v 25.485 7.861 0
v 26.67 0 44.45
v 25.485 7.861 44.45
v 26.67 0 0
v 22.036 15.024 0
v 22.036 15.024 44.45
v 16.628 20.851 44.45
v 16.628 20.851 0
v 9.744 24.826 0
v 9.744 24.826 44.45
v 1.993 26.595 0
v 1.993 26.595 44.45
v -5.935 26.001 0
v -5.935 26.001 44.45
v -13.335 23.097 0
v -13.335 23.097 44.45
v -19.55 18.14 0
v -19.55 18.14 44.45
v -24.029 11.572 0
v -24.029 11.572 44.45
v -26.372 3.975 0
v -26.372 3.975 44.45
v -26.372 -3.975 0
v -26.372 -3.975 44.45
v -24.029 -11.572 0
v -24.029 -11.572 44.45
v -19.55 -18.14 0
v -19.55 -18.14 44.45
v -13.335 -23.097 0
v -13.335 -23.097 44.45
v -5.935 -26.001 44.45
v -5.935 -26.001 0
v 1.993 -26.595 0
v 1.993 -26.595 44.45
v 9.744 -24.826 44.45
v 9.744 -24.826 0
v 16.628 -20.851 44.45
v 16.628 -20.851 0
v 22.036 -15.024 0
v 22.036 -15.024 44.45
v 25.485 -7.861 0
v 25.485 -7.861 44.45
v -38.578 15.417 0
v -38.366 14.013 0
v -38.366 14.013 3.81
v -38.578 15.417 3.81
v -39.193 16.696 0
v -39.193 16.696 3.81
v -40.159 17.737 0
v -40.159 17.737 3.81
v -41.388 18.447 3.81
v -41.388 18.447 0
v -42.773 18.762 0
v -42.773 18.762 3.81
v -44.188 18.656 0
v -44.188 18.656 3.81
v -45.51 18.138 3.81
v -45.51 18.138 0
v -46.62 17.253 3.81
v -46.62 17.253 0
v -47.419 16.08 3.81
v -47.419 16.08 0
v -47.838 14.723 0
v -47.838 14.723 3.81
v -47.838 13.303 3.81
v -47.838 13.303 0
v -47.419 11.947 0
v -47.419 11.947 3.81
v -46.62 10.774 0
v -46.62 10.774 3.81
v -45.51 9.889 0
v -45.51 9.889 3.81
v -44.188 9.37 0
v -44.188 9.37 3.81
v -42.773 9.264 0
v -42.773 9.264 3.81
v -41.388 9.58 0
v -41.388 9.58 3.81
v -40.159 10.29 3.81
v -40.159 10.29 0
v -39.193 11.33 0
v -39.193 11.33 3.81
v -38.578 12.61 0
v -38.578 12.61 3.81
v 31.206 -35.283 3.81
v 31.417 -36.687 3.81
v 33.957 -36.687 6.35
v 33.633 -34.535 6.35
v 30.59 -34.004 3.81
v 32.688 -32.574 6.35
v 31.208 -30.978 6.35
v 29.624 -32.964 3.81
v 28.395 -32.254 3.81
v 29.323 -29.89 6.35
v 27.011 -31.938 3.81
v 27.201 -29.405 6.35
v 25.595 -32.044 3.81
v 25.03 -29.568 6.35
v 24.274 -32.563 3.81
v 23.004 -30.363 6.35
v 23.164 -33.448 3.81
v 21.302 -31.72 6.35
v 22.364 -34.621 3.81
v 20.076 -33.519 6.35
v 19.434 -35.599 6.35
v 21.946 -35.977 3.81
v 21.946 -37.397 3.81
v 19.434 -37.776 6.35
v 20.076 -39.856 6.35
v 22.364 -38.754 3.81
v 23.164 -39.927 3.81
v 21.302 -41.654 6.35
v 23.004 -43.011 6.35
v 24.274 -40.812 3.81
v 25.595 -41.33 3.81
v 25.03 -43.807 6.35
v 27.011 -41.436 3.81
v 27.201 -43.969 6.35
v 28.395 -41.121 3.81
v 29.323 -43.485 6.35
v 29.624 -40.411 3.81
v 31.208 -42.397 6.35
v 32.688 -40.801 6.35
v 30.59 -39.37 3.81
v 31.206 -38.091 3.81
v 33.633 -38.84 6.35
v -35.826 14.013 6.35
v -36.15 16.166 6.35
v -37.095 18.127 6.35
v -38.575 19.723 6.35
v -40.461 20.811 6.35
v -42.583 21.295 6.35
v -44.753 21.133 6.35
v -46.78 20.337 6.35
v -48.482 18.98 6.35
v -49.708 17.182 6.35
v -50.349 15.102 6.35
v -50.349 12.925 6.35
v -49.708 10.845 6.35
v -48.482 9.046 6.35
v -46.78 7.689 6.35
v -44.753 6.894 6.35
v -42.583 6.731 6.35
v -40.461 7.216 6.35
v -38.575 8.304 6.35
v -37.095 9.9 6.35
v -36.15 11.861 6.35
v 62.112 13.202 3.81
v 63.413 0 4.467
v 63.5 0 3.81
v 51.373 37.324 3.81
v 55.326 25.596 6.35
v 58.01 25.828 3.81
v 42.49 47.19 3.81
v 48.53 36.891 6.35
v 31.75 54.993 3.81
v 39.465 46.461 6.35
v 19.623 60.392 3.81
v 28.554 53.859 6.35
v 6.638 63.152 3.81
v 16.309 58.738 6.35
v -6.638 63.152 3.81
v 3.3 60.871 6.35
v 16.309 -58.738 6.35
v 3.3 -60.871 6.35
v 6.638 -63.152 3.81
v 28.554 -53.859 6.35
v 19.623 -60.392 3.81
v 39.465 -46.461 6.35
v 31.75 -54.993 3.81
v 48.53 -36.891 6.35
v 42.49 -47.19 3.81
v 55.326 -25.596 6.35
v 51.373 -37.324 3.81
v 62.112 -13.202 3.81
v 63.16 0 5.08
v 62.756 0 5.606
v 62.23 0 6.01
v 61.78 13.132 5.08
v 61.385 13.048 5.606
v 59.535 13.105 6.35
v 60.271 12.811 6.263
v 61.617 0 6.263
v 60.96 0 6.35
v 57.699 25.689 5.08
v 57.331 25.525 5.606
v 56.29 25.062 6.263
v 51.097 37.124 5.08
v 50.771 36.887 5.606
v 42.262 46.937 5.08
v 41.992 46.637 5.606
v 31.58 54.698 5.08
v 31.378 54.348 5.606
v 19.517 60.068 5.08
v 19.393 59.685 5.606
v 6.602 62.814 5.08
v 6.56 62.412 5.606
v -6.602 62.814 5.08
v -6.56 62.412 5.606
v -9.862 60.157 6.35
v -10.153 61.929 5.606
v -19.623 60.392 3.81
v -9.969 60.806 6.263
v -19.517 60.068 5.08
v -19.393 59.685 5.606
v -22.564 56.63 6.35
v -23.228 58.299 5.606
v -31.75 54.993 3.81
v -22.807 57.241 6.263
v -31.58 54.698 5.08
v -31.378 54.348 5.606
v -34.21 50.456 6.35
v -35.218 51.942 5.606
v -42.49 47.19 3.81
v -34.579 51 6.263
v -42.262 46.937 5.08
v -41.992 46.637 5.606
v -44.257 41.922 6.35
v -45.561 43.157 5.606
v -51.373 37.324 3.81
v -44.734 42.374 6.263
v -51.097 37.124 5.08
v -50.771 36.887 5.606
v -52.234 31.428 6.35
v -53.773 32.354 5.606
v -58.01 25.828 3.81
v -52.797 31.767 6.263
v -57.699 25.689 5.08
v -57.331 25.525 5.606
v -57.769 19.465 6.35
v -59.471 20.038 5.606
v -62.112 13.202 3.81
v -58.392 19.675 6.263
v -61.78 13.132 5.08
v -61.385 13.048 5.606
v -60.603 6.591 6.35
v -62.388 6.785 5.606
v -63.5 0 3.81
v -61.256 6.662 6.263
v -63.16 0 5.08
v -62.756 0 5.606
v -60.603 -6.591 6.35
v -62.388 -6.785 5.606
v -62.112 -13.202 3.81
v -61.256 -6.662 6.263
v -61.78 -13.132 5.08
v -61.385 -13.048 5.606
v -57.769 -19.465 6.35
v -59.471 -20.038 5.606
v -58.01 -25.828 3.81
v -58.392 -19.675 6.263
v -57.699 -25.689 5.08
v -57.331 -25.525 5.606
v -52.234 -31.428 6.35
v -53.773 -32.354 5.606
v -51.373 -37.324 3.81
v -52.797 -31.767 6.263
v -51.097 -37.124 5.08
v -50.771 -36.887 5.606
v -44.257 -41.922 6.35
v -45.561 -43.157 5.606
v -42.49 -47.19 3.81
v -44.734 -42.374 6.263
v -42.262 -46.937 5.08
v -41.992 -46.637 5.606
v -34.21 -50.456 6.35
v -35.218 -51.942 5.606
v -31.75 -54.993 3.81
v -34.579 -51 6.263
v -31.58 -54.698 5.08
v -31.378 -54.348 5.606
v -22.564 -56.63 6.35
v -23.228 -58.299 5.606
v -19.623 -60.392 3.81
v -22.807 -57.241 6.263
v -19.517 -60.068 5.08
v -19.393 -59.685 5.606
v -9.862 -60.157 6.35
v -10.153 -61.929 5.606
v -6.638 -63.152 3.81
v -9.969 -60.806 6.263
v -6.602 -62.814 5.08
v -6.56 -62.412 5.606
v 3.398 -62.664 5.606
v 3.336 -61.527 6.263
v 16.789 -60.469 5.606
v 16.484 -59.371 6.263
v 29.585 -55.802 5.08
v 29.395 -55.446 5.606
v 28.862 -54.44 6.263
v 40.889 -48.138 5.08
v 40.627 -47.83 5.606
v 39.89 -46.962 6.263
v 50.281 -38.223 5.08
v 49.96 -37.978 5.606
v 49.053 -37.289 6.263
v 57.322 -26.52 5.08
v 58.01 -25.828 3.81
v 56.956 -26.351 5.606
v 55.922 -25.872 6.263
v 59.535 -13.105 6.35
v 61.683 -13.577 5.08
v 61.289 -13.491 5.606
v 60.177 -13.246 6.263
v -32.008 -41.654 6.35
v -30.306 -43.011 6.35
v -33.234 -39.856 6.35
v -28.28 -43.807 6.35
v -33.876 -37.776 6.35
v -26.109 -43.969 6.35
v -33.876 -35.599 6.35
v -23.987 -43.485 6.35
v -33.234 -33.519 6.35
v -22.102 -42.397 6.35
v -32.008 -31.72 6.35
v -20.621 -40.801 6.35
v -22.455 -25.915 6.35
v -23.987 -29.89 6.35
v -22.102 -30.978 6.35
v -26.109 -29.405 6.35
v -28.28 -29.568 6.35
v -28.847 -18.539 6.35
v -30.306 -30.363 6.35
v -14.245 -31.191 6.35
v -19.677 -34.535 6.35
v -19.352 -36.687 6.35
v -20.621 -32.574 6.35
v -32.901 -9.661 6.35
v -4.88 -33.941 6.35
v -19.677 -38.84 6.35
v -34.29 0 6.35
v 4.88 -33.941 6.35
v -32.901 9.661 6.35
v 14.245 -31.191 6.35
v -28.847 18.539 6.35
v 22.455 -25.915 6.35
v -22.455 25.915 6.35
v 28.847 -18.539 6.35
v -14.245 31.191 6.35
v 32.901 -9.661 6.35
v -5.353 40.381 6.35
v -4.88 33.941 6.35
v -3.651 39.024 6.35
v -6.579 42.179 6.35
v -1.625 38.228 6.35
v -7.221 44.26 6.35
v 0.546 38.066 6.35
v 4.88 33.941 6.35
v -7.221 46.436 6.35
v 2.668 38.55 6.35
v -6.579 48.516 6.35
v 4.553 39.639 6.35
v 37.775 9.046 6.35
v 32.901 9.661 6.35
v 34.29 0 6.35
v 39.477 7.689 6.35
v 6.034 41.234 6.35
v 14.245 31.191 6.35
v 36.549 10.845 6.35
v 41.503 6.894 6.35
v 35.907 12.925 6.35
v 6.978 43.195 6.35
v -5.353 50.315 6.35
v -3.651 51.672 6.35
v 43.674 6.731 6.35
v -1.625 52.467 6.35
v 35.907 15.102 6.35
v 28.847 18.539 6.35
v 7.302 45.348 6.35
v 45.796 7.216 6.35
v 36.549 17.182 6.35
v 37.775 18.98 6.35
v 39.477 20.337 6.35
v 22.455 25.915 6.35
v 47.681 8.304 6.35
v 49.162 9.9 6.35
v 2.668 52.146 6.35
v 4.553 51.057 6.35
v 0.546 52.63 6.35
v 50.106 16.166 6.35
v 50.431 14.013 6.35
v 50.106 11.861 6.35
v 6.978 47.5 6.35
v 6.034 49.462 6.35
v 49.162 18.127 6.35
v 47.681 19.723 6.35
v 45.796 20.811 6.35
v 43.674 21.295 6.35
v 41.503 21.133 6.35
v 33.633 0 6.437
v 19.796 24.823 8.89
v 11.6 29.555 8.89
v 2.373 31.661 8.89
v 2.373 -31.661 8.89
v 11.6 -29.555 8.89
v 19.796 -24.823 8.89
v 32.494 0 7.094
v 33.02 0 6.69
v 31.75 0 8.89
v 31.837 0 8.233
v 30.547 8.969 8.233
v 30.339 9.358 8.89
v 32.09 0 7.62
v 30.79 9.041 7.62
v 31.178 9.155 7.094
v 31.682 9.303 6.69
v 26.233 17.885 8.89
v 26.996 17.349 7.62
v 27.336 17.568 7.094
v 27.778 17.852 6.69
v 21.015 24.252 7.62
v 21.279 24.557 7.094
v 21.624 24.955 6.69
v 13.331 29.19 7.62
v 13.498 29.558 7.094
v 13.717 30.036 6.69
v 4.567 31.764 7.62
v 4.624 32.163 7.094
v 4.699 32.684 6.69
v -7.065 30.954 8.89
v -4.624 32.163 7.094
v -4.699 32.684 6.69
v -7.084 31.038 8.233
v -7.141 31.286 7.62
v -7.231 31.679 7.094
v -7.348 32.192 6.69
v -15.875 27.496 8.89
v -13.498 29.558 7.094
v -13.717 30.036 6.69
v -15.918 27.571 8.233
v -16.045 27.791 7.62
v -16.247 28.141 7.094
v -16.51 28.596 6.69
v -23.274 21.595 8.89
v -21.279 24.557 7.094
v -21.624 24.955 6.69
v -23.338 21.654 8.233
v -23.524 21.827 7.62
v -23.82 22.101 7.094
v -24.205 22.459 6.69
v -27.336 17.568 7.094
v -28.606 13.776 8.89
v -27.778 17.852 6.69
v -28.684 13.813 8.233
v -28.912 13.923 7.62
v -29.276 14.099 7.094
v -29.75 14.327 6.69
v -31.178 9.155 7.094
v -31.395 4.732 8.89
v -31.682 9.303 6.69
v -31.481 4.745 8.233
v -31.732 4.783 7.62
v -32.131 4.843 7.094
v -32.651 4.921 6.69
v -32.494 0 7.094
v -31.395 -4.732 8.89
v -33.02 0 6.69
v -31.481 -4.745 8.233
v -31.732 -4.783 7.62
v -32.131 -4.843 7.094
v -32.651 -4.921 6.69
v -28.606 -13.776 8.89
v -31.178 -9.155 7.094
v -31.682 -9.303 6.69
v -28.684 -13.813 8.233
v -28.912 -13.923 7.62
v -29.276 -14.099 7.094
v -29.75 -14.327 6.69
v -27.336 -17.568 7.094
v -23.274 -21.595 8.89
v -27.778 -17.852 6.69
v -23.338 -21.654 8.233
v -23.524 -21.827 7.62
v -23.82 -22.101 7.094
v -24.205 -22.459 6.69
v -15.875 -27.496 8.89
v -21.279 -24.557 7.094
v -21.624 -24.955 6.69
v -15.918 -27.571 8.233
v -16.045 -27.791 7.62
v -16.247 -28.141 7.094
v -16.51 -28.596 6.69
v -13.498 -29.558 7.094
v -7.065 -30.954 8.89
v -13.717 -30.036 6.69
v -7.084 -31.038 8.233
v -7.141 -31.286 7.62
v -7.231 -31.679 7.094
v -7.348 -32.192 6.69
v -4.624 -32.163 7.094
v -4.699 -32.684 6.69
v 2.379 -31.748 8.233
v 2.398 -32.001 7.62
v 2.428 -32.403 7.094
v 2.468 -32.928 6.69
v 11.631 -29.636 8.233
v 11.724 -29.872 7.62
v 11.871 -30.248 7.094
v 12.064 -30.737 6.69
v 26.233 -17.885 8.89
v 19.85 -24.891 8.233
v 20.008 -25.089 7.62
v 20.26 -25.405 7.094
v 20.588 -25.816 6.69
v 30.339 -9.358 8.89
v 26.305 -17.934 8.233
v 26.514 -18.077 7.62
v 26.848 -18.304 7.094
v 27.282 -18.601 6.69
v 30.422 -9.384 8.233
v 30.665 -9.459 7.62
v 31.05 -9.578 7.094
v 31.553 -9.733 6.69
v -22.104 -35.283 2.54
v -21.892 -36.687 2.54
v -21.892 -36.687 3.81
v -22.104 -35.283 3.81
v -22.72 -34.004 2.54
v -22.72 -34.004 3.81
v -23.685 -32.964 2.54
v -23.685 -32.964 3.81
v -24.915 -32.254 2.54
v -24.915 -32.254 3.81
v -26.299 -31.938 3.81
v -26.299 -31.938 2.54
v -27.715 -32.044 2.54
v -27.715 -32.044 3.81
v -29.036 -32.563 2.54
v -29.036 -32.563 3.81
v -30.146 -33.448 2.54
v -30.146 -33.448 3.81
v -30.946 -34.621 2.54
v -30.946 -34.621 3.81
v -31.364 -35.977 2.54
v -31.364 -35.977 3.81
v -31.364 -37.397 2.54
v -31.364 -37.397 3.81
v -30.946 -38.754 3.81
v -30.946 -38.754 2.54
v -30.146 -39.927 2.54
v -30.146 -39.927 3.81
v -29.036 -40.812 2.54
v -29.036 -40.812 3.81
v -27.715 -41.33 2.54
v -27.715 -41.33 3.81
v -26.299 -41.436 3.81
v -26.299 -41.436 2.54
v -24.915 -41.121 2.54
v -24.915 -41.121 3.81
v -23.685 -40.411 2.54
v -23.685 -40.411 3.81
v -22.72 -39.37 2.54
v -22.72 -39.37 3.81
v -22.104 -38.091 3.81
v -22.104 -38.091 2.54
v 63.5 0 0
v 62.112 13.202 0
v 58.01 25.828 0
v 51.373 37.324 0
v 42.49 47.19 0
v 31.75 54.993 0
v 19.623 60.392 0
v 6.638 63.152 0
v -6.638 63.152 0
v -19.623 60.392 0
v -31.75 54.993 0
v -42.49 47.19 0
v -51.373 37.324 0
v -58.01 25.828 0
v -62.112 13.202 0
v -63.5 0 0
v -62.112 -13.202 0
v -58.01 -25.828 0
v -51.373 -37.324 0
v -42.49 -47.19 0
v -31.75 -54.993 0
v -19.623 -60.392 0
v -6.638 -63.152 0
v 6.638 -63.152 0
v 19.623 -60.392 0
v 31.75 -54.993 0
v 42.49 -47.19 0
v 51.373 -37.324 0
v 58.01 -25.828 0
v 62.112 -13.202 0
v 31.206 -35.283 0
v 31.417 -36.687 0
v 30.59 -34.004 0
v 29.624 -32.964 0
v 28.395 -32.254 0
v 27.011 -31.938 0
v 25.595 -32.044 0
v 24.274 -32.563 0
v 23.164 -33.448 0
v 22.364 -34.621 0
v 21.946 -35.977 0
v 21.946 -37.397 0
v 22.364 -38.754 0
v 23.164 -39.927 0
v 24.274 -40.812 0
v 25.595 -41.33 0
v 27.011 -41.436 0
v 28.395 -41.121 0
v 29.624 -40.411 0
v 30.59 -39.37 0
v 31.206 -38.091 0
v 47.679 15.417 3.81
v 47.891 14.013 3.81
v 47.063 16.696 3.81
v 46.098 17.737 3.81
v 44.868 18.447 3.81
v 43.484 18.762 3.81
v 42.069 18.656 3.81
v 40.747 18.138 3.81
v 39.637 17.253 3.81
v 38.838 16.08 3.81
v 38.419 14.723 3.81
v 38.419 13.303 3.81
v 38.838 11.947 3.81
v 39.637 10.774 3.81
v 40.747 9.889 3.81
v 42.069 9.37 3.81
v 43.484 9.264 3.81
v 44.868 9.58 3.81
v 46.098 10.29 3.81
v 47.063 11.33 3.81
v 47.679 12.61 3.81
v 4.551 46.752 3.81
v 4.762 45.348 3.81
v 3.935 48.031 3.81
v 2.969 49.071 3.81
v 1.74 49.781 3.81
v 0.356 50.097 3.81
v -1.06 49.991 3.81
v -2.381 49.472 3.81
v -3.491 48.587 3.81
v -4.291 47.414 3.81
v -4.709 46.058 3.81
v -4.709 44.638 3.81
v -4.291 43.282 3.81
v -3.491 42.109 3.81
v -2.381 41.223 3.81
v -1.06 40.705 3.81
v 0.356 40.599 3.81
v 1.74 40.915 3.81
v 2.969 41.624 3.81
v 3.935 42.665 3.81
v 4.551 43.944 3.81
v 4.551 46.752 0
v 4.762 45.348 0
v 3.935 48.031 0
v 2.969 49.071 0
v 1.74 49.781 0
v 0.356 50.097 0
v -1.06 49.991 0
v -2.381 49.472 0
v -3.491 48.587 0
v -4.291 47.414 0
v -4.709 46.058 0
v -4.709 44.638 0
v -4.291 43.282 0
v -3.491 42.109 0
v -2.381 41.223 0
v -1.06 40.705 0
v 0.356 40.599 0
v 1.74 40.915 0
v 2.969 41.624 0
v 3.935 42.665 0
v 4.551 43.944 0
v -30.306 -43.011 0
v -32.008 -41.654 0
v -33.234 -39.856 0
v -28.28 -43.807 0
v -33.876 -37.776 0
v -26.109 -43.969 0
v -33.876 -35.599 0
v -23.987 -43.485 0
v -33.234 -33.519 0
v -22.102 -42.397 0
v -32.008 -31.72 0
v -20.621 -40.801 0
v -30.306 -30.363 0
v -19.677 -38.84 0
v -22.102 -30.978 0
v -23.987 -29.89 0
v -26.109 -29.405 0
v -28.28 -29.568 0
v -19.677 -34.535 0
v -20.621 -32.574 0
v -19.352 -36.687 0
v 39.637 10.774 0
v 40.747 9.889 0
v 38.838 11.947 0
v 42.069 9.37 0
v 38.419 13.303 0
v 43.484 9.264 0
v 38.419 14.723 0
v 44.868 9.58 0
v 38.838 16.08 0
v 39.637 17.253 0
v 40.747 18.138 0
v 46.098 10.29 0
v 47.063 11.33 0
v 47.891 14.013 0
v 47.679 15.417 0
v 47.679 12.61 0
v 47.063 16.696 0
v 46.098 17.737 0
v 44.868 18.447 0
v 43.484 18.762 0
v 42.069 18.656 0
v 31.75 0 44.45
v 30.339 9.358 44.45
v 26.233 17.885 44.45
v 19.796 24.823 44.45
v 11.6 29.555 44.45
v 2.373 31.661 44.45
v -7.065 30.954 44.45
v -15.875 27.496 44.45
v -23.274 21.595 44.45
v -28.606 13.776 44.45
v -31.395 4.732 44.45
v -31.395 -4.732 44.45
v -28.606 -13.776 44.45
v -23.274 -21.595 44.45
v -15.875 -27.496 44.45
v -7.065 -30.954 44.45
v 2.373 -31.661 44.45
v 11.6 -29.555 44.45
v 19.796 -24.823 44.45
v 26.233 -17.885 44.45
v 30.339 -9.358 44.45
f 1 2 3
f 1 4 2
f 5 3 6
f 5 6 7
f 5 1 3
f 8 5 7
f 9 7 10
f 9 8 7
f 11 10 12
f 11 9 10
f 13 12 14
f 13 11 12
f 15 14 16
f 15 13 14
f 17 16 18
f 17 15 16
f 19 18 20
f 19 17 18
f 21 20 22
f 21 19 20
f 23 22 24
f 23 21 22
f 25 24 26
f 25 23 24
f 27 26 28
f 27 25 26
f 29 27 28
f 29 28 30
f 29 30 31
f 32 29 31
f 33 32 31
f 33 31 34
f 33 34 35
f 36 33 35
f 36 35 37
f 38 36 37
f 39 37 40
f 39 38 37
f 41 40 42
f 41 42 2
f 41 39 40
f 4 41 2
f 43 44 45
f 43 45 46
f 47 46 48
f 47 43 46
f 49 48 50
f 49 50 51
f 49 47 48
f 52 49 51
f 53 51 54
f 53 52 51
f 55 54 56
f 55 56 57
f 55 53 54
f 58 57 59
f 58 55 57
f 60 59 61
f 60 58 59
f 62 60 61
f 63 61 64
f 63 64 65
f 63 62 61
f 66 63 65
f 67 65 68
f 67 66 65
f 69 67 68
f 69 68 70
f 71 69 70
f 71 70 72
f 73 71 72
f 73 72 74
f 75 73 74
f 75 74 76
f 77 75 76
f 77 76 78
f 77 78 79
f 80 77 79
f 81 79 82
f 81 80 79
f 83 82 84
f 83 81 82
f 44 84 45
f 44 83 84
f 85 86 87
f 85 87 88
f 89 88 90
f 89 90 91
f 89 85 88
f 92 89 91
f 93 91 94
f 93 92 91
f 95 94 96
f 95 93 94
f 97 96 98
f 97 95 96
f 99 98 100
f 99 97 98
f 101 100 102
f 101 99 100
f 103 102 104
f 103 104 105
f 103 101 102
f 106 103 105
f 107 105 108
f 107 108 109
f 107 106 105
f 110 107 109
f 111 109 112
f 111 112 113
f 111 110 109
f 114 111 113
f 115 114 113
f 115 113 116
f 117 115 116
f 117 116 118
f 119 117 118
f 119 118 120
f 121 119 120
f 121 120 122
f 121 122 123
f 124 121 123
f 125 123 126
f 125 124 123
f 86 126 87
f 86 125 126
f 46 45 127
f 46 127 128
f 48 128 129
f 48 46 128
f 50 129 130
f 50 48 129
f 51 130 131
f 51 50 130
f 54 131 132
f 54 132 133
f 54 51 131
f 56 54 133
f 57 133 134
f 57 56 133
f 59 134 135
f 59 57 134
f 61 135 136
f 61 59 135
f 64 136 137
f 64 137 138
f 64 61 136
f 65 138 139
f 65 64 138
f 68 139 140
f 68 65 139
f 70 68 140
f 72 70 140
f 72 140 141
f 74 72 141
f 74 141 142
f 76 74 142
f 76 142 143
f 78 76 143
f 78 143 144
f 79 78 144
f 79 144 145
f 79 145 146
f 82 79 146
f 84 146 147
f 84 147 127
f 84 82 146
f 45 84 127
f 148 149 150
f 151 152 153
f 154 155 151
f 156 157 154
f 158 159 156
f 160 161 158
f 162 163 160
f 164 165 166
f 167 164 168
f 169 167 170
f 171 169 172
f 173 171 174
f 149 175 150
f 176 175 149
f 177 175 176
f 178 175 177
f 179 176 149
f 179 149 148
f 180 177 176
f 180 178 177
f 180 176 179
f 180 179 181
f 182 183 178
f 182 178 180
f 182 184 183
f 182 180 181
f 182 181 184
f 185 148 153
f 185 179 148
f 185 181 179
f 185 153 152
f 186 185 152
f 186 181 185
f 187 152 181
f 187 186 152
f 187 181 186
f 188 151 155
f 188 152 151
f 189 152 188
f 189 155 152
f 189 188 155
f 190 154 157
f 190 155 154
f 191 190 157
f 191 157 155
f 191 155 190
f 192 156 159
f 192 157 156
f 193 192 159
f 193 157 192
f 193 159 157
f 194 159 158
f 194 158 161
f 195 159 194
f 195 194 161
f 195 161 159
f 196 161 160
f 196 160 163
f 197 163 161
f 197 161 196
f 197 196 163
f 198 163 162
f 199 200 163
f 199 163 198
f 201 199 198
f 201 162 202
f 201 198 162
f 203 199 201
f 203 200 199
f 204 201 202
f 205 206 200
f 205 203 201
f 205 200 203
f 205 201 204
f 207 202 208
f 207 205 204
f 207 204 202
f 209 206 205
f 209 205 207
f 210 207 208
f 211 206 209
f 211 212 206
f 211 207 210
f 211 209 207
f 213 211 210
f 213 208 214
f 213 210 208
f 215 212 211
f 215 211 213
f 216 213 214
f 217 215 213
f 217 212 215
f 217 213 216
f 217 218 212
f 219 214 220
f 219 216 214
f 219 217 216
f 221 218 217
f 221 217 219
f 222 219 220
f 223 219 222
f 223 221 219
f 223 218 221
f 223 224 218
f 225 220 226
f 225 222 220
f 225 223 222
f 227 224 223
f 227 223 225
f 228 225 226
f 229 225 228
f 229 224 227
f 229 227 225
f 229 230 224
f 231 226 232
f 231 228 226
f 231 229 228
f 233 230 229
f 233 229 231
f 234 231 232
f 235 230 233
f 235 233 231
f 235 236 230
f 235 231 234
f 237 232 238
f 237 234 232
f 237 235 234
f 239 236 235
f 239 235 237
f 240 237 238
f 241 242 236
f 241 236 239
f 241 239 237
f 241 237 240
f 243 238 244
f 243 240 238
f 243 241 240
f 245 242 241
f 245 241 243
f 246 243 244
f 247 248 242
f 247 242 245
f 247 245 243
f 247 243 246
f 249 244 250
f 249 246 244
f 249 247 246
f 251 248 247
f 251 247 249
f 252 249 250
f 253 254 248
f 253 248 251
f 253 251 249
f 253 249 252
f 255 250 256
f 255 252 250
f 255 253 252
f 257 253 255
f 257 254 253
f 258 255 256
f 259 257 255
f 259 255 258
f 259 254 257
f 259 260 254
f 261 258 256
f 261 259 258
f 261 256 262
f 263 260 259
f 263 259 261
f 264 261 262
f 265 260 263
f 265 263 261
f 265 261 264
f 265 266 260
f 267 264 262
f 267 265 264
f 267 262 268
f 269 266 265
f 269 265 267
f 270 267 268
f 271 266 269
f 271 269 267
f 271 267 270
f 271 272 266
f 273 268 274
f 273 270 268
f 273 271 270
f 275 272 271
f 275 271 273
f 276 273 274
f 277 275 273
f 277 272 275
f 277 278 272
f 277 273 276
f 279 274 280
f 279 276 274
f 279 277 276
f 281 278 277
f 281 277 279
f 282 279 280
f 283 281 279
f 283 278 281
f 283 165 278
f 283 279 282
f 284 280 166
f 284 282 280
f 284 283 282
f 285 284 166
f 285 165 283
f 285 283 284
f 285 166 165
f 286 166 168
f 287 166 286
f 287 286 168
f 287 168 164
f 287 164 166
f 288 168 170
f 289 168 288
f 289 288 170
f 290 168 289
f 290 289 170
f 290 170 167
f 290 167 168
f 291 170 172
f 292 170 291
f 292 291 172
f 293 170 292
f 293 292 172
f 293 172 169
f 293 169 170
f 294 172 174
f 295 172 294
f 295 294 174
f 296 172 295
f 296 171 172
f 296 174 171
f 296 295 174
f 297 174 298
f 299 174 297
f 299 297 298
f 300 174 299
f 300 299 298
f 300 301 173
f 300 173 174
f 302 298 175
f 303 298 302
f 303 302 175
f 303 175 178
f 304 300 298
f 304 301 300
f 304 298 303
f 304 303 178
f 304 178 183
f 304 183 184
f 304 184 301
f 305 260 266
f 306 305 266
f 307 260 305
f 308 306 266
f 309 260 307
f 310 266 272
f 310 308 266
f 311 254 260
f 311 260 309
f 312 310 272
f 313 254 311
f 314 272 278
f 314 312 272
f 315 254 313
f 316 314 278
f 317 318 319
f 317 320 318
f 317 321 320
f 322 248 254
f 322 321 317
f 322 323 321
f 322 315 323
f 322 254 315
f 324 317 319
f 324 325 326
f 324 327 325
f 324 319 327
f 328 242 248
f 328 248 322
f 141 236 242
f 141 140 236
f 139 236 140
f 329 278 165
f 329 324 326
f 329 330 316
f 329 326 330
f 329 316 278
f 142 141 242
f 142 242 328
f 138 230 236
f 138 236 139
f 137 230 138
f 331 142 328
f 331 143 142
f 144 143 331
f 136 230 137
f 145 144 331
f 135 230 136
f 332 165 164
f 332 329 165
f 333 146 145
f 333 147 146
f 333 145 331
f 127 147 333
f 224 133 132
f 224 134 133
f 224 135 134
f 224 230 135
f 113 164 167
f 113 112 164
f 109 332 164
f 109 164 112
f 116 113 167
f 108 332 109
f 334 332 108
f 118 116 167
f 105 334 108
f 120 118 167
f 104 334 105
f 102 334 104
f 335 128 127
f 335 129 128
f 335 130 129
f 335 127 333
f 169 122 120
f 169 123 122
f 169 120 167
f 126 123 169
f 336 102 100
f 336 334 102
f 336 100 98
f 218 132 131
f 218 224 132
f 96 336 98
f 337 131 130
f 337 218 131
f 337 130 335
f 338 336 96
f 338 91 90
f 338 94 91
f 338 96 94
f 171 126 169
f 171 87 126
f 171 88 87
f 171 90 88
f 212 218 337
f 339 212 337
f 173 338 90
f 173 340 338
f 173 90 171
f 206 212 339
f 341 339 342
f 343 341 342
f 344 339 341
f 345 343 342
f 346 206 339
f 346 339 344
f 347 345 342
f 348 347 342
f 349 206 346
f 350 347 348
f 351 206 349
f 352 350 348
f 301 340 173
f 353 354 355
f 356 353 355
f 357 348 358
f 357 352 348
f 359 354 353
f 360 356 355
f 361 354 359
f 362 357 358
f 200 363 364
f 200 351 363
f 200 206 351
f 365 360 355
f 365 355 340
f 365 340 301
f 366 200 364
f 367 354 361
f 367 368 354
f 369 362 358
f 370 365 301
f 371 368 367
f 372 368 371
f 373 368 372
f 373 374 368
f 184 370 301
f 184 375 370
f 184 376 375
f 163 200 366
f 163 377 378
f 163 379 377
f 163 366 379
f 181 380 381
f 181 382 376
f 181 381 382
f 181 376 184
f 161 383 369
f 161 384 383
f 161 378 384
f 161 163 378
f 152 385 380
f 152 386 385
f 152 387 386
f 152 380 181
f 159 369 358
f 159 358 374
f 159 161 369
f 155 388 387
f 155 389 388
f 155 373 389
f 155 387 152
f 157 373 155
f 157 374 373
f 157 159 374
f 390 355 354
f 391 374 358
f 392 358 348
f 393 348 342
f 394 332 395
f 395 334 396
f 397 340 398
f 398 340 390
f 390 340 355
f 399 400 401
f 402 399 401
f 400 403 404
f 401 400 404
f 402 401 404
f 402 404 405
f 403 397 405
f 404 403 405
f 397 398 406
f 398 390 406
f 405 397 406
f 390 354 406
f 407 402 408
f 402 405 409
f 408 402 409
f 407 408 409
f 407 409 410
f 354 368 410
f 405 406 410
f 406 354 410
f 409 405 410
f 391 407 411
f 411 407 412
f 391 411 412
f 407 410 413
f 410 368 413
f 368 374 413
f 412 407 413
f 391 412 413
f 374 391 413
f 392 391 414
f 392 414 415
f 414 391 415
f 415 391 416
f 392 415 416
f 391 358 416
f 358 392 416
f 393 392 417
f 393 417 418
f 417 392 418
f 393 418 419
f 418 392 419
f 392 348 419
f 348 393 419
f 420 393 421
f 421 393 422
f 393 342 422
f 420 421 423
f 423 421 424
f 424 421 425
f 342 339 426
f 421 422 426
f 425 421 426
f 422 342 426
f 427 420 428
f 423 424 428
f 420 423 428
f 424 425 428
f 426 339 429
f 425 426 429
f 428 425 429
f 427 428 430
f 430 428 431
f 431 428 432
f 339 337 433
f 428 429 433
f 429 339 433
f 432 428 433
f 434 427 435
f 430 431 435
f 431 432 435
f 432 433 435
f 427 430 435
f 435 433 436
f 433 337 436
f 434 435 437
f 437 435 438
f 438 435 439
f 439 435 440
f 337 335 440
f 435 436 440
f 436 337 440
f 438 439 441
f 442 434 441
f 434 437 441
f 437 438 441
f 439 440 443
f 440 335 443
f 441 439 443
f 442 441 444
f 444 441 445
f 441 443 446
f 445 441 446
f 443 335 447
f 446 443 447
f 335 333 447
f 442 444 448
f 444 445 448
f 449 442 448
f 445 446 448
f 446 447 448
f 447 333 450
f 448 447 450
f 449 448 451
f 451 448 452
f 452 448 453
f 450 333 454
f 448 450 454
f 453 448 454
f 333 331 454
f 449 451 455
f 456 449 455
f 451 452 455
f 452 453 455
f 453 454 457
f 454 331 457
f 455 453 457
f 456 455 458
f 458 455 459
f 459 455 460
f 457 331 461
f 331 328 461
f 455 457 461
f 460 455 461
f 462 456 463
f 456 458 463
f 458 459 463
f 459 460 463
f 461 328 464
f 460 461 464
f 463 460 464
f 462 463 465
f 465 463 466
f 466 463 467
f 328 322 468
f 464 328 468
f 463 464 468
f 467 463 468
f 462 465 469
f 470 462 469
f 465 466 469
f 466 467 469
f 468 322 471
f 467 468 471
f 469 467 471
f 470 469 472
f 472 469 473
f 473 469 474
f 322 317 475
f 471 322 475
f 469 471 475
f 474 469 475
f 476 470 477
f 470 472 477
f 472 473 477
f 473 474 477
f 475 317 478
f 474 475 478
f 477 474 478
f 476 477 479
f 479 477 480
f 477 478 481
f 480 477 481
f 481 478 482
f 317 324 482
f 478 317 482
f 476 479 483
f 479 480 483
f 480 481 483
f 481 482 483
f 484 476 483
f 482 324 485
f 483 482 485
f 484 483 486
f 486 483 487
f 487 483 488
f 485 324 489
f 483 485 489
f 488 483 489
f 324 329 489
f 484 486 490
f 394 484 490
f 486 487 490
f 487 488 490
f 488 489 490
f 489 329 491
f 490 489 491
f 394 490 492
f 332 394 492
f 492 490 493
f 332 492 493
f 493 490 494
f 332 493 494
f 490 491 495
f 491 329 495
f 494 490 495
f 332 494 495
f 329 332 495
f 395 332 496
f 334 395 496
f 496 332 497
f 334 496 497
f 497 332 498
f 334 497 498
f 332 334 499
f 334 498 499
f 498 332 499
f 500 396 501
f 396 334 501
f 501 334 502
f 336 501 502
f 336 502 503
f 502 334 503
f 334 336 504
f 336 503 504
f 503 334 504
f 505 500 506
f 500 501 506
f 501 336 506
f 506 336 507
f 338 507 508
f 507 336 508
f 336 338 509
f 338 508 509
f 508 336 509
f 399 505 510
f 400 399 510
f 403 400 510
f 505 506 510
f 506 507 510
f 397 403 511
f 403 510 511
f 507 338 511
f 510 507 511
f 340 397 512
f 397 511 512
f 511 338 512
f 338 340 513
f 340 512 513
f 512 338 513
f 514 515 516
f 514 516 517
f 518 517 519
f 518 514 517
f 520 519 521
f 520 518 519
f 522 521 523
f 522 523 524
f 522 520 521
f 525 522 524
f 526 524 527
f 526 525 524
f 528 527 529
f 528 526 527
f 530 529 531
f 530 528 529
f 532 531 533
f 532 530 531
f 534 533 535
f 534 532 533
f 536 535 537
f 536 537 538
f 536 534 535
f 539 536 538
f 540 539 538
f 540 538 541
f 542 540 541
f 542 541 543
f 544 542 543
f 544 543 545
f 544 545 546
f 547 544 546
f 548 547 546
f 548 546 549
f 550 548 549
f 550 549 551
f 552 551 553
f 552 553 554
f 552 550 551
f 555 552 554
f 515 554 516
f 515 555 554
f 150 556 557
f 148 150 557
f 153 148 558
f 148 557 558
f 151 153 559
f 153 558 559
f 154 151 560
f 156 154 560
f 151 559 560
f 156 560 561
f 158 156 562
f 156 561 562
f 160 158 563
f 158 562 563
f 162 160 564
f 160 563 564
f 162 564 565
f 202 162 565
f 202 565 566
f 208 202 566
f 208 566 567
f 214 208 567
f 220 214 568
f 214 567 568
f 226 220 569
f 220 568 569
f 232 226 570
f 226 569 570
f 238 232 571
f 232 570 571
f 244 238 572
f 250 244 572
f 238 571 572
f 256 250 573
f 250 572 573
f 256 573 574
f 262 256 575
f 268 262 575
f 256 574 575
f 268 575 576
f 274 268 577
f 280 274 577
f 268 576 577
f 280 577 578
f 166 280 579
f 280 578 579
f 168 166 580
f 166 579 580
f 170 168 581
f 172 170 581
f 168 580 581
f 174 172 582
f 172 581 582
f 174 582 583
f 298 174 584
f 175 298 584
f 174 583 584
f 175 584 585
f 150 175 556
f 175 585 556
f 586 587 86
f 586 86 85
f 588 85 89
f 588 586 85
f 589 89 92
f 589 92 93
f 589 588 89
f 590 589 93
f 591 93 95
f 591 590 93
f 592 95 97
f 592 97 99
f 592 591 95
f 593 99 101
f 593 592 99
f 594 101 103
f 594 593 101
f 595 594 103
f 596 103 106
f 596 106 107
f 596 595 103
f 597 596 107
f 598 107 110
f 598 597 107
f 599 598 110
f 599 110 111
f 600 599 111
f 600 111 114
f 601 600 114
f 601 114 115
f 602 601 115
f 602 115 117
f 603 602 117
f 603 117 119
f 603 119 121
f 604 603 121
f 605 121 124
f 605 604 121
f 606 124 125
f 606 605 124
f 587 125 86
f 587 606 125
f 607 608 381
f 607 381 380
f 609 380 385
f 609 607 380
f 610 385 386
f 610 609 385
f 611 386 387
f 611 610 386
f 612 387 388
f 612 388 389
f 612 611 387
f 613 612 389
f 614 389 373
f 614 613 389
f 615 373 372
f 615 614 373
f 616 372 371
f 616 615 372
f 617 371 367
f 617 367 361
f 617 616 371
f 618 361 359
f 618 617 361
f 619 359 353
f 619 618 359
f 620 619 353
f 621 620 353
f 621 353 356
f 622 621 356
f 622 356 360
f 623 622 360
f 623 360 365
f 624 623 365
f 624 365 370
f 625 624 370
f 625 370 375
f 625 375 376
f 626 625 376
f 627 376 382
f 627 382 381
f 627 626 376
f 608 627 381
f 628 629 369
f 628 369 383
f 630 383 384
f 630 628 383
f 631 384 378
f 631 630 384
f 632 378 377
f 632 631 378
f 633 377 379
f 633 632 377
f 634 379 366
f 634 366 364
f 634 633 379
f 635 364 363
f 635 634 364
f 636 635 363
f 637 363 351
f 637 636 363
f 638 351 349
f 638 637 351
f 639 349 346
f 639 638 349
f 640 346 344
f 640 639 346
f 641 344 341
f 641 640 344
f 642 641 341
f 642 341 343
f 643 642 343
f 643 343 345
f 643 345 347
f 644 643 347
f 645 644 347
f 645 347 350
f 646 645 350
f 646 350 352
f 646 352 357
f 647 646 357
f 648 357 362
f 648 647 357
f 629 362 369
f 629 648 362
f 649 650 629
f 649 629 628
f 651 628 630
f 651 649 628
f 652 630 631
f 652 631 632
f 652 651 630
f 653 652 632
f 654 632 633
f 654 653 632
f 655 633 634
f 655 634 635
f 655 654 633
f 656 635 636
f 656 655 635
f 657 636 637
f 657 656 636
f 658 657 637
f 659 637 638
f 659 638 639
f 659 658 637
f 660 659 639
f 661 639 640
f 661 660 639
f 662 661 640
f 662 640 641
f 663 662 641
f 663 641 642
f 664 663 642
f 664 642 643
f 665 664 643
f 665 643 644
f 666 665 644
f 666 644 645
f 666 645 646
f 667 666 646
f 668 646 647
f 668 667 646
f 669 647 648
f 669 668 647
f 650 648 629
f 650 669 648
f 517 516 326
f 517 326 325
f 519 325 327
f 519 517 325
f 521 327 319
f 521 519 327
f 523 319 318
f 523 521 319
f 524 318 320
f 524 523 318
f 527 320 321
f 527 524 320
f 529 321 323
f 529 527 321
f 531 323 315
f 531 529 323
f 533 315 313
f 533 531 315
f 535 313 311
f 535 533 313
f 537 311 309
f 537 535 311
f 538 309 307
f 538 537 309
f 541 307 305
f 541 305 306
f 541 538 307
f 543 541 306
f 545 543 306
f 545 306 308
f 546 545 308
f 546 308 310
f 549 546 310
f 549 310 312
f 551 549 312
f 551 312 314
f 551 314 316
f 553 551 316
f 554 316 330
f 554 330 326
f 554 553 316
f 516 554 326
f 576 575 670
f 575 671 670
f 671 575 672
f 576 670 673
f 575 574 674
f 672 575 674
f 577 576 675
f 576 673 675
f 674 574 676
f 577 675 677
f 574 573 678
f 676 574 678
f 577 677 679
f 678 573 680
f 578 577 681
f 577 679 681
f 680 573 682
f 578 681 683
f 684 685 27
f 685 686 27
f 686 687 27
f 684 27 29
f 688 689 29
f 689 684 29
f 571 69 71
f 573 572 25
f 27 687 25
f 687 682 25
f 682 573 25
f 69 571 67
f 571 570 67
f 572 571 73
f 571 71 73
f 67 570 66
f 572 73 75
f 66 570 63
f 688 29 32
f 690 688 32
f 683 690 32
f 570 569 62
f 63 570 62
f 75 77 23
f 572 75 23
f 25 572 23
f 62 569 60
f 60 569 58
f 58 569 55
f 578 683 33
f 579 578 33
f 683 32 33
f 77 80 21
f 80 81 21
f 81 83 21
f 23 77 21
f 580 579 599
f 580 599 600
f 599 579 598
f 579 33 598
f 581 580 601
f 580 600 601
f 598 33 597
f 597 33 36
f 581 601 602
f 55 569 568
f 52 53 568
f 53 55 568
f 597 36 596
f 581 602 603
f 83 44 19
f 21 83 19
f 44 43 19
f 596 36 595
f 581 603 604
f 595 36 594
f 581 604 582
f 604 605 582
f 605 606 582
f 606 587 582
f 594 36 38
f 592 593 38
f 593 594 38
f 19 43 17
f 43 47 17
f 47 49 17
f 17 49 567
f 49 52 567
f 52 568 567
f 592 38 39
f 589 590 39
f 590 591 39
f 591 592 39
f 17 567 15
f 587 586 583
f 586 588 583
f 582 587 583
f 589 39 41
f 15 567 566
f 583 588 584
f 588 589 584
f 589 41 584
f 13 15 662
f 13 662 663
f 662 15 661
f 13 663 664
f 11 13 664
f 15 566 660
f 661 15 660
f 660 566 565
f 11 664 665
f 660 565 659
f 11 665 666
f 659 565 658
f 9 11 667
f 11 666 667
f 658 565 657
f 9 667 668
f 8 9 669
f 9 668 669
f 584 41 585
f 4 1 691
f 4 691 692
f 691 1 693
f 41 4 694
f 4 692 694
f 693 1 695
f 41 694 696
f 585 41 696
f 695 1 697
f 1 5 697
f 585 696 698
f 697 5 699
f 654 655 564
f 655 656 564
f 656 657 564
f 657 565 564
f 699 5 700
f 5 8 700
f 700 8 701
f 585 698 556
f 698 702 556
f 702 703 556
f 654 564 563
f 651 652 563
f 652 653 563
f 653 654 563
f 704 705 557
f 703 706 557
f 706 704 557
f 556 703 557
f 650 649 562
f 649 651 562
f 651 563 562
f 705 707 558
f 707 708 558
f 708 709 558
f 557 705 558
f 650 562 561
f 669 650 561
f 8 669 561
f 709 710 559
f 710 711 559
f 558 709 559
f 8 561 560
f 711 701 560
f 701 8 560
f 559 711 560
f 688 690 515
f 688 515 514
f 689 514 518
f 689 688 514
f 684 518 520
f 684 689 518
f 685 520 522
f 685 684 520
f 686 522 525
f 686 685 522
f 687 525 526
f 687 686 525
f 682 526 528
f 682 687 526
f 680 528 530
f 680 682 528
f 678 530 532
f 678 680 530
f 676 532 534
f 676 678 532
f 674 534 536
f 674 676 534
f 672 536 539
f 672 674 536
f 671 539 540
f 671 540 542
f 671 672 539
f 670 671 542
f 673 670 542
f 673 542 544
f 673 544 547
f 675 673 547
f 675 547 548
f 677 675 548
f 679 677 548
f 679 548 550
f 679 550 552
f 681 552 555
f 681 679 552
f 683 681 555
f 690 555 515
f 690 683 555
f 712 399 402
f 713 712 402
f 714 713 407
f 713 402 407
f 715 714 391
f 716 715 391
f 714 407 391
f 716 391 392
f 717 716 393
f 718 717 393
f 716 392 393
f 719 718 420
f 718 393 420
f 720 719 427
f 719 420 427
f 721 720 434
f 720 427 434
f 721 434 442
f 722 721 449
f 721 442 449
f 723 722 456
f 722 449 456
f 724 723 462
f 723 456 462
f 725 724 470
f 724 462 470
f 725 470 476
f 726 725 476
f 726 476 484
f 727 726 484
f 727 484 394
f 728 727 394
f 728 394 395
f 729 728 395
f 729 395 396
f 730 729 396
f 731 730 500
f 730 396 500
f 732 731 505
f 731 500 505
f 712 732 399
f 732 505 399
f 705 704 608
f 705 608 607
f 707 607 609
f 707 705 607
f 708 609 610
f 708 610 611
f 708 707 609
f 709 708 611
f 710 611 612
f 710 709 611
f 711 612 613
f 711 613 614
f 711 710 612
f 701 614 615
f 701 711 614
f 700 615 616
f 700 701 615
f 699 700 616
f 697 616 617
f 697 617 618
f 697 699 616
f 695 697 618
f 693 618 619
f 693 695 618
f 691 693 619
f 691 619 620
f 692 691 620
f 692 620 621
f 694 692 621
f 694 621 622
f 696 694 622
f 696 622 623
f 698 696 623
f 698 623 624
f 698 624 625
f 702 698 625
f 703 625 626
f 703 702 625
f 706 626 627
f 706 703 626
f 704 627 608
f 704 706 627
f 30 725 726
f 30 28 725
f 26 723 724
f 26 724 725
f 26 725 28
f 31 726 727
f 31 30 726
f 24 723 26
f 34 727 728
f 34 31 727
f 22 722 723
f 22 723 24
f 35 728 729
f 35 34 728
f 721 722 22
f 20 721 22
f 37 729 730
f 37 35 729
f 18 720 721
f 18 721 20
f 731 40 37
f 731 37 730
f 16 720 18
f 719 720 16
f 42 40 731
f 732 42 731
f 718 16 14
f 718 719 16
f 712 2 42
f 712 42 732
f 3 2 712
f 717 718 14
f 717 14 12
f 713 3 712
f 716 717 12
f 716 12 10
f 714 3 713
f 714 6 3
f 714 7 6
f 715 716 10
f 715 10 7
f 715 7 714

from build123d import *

# Parameters (mm, degrees)
F0_R     = 63.5
F0_R_2   = 4.7625
F0_R_3   = 26.67
F1_DEPTH = 6.35
F2_R     = 31.75
F2_R_2   = 26.67
F3_DEPTH = 38.1
F4_R     = 2.54
F5_SIZE  = 2.54


with BuildPart() as f1:
    # F0 (on Top) → F1 (new body)
    with BuildSketch(Plane.XY):
        Circle(F0_R)
        with Locations((-26.654833, -36.68723)):
            Circle(F0_R_2, mode=Mode.SUBTRACT)
        with Locations((26.654833, -36.68723)):
            Circle(F0_R_2, mode=Mode.SUBTRACT)
        with Locations((-43.128426, 14.013275)):
            Circle(F0_R_2, mode=Mode.SUBTRACT)
        Circle(F0_R_3, mode=Mode.SUBTRACT)
        with Locations((43.128426, 14.013275)):
            Circle(F0_R_2, mode=Mode.SUBTRACT)
        with Locations((0, 45.34791)):
            Circle(F0_R_2, mode=Mode.SUBTRACT)
    extrude(amount=F1_DEPTH)

    # F2 (on face) → F3 (join)
    with BuildSketch(Plane.XY.offset(6.35)):
        Circle(F2_R)
        Circle(F2_R_2, mode=Mode.SUBTRACT)
    extrude(amount=F3_DEPTH)

    # F4
    f4_edges = [f1.edges().sort_by_distance(p)[0] for p in [
        (-31.75, 0, 6.35),
        (-63.5, 0, 6.35),
    ]]
    fillet(f4_edges, radius=F4_R)

    # F5
    f5_edges = [f1.edges().sort_by_distance(p)[0] for p in [
        (-47.890926, 14.013275, 6.35),
        (-21.892333, -36.68723, 3.175),
        (-31.417333, -36.68723, 0),
        (-31.417333, -36.68723, 6.35),
        (21.892333, -36.68723, 6.35),
        (38.365926, 14.013275, 6.35),
        (-4.7625, 45.34791, 6.35),
    ]]
    chamfer(f5_edges, length=F5_SIZE)


solid = f1.part
